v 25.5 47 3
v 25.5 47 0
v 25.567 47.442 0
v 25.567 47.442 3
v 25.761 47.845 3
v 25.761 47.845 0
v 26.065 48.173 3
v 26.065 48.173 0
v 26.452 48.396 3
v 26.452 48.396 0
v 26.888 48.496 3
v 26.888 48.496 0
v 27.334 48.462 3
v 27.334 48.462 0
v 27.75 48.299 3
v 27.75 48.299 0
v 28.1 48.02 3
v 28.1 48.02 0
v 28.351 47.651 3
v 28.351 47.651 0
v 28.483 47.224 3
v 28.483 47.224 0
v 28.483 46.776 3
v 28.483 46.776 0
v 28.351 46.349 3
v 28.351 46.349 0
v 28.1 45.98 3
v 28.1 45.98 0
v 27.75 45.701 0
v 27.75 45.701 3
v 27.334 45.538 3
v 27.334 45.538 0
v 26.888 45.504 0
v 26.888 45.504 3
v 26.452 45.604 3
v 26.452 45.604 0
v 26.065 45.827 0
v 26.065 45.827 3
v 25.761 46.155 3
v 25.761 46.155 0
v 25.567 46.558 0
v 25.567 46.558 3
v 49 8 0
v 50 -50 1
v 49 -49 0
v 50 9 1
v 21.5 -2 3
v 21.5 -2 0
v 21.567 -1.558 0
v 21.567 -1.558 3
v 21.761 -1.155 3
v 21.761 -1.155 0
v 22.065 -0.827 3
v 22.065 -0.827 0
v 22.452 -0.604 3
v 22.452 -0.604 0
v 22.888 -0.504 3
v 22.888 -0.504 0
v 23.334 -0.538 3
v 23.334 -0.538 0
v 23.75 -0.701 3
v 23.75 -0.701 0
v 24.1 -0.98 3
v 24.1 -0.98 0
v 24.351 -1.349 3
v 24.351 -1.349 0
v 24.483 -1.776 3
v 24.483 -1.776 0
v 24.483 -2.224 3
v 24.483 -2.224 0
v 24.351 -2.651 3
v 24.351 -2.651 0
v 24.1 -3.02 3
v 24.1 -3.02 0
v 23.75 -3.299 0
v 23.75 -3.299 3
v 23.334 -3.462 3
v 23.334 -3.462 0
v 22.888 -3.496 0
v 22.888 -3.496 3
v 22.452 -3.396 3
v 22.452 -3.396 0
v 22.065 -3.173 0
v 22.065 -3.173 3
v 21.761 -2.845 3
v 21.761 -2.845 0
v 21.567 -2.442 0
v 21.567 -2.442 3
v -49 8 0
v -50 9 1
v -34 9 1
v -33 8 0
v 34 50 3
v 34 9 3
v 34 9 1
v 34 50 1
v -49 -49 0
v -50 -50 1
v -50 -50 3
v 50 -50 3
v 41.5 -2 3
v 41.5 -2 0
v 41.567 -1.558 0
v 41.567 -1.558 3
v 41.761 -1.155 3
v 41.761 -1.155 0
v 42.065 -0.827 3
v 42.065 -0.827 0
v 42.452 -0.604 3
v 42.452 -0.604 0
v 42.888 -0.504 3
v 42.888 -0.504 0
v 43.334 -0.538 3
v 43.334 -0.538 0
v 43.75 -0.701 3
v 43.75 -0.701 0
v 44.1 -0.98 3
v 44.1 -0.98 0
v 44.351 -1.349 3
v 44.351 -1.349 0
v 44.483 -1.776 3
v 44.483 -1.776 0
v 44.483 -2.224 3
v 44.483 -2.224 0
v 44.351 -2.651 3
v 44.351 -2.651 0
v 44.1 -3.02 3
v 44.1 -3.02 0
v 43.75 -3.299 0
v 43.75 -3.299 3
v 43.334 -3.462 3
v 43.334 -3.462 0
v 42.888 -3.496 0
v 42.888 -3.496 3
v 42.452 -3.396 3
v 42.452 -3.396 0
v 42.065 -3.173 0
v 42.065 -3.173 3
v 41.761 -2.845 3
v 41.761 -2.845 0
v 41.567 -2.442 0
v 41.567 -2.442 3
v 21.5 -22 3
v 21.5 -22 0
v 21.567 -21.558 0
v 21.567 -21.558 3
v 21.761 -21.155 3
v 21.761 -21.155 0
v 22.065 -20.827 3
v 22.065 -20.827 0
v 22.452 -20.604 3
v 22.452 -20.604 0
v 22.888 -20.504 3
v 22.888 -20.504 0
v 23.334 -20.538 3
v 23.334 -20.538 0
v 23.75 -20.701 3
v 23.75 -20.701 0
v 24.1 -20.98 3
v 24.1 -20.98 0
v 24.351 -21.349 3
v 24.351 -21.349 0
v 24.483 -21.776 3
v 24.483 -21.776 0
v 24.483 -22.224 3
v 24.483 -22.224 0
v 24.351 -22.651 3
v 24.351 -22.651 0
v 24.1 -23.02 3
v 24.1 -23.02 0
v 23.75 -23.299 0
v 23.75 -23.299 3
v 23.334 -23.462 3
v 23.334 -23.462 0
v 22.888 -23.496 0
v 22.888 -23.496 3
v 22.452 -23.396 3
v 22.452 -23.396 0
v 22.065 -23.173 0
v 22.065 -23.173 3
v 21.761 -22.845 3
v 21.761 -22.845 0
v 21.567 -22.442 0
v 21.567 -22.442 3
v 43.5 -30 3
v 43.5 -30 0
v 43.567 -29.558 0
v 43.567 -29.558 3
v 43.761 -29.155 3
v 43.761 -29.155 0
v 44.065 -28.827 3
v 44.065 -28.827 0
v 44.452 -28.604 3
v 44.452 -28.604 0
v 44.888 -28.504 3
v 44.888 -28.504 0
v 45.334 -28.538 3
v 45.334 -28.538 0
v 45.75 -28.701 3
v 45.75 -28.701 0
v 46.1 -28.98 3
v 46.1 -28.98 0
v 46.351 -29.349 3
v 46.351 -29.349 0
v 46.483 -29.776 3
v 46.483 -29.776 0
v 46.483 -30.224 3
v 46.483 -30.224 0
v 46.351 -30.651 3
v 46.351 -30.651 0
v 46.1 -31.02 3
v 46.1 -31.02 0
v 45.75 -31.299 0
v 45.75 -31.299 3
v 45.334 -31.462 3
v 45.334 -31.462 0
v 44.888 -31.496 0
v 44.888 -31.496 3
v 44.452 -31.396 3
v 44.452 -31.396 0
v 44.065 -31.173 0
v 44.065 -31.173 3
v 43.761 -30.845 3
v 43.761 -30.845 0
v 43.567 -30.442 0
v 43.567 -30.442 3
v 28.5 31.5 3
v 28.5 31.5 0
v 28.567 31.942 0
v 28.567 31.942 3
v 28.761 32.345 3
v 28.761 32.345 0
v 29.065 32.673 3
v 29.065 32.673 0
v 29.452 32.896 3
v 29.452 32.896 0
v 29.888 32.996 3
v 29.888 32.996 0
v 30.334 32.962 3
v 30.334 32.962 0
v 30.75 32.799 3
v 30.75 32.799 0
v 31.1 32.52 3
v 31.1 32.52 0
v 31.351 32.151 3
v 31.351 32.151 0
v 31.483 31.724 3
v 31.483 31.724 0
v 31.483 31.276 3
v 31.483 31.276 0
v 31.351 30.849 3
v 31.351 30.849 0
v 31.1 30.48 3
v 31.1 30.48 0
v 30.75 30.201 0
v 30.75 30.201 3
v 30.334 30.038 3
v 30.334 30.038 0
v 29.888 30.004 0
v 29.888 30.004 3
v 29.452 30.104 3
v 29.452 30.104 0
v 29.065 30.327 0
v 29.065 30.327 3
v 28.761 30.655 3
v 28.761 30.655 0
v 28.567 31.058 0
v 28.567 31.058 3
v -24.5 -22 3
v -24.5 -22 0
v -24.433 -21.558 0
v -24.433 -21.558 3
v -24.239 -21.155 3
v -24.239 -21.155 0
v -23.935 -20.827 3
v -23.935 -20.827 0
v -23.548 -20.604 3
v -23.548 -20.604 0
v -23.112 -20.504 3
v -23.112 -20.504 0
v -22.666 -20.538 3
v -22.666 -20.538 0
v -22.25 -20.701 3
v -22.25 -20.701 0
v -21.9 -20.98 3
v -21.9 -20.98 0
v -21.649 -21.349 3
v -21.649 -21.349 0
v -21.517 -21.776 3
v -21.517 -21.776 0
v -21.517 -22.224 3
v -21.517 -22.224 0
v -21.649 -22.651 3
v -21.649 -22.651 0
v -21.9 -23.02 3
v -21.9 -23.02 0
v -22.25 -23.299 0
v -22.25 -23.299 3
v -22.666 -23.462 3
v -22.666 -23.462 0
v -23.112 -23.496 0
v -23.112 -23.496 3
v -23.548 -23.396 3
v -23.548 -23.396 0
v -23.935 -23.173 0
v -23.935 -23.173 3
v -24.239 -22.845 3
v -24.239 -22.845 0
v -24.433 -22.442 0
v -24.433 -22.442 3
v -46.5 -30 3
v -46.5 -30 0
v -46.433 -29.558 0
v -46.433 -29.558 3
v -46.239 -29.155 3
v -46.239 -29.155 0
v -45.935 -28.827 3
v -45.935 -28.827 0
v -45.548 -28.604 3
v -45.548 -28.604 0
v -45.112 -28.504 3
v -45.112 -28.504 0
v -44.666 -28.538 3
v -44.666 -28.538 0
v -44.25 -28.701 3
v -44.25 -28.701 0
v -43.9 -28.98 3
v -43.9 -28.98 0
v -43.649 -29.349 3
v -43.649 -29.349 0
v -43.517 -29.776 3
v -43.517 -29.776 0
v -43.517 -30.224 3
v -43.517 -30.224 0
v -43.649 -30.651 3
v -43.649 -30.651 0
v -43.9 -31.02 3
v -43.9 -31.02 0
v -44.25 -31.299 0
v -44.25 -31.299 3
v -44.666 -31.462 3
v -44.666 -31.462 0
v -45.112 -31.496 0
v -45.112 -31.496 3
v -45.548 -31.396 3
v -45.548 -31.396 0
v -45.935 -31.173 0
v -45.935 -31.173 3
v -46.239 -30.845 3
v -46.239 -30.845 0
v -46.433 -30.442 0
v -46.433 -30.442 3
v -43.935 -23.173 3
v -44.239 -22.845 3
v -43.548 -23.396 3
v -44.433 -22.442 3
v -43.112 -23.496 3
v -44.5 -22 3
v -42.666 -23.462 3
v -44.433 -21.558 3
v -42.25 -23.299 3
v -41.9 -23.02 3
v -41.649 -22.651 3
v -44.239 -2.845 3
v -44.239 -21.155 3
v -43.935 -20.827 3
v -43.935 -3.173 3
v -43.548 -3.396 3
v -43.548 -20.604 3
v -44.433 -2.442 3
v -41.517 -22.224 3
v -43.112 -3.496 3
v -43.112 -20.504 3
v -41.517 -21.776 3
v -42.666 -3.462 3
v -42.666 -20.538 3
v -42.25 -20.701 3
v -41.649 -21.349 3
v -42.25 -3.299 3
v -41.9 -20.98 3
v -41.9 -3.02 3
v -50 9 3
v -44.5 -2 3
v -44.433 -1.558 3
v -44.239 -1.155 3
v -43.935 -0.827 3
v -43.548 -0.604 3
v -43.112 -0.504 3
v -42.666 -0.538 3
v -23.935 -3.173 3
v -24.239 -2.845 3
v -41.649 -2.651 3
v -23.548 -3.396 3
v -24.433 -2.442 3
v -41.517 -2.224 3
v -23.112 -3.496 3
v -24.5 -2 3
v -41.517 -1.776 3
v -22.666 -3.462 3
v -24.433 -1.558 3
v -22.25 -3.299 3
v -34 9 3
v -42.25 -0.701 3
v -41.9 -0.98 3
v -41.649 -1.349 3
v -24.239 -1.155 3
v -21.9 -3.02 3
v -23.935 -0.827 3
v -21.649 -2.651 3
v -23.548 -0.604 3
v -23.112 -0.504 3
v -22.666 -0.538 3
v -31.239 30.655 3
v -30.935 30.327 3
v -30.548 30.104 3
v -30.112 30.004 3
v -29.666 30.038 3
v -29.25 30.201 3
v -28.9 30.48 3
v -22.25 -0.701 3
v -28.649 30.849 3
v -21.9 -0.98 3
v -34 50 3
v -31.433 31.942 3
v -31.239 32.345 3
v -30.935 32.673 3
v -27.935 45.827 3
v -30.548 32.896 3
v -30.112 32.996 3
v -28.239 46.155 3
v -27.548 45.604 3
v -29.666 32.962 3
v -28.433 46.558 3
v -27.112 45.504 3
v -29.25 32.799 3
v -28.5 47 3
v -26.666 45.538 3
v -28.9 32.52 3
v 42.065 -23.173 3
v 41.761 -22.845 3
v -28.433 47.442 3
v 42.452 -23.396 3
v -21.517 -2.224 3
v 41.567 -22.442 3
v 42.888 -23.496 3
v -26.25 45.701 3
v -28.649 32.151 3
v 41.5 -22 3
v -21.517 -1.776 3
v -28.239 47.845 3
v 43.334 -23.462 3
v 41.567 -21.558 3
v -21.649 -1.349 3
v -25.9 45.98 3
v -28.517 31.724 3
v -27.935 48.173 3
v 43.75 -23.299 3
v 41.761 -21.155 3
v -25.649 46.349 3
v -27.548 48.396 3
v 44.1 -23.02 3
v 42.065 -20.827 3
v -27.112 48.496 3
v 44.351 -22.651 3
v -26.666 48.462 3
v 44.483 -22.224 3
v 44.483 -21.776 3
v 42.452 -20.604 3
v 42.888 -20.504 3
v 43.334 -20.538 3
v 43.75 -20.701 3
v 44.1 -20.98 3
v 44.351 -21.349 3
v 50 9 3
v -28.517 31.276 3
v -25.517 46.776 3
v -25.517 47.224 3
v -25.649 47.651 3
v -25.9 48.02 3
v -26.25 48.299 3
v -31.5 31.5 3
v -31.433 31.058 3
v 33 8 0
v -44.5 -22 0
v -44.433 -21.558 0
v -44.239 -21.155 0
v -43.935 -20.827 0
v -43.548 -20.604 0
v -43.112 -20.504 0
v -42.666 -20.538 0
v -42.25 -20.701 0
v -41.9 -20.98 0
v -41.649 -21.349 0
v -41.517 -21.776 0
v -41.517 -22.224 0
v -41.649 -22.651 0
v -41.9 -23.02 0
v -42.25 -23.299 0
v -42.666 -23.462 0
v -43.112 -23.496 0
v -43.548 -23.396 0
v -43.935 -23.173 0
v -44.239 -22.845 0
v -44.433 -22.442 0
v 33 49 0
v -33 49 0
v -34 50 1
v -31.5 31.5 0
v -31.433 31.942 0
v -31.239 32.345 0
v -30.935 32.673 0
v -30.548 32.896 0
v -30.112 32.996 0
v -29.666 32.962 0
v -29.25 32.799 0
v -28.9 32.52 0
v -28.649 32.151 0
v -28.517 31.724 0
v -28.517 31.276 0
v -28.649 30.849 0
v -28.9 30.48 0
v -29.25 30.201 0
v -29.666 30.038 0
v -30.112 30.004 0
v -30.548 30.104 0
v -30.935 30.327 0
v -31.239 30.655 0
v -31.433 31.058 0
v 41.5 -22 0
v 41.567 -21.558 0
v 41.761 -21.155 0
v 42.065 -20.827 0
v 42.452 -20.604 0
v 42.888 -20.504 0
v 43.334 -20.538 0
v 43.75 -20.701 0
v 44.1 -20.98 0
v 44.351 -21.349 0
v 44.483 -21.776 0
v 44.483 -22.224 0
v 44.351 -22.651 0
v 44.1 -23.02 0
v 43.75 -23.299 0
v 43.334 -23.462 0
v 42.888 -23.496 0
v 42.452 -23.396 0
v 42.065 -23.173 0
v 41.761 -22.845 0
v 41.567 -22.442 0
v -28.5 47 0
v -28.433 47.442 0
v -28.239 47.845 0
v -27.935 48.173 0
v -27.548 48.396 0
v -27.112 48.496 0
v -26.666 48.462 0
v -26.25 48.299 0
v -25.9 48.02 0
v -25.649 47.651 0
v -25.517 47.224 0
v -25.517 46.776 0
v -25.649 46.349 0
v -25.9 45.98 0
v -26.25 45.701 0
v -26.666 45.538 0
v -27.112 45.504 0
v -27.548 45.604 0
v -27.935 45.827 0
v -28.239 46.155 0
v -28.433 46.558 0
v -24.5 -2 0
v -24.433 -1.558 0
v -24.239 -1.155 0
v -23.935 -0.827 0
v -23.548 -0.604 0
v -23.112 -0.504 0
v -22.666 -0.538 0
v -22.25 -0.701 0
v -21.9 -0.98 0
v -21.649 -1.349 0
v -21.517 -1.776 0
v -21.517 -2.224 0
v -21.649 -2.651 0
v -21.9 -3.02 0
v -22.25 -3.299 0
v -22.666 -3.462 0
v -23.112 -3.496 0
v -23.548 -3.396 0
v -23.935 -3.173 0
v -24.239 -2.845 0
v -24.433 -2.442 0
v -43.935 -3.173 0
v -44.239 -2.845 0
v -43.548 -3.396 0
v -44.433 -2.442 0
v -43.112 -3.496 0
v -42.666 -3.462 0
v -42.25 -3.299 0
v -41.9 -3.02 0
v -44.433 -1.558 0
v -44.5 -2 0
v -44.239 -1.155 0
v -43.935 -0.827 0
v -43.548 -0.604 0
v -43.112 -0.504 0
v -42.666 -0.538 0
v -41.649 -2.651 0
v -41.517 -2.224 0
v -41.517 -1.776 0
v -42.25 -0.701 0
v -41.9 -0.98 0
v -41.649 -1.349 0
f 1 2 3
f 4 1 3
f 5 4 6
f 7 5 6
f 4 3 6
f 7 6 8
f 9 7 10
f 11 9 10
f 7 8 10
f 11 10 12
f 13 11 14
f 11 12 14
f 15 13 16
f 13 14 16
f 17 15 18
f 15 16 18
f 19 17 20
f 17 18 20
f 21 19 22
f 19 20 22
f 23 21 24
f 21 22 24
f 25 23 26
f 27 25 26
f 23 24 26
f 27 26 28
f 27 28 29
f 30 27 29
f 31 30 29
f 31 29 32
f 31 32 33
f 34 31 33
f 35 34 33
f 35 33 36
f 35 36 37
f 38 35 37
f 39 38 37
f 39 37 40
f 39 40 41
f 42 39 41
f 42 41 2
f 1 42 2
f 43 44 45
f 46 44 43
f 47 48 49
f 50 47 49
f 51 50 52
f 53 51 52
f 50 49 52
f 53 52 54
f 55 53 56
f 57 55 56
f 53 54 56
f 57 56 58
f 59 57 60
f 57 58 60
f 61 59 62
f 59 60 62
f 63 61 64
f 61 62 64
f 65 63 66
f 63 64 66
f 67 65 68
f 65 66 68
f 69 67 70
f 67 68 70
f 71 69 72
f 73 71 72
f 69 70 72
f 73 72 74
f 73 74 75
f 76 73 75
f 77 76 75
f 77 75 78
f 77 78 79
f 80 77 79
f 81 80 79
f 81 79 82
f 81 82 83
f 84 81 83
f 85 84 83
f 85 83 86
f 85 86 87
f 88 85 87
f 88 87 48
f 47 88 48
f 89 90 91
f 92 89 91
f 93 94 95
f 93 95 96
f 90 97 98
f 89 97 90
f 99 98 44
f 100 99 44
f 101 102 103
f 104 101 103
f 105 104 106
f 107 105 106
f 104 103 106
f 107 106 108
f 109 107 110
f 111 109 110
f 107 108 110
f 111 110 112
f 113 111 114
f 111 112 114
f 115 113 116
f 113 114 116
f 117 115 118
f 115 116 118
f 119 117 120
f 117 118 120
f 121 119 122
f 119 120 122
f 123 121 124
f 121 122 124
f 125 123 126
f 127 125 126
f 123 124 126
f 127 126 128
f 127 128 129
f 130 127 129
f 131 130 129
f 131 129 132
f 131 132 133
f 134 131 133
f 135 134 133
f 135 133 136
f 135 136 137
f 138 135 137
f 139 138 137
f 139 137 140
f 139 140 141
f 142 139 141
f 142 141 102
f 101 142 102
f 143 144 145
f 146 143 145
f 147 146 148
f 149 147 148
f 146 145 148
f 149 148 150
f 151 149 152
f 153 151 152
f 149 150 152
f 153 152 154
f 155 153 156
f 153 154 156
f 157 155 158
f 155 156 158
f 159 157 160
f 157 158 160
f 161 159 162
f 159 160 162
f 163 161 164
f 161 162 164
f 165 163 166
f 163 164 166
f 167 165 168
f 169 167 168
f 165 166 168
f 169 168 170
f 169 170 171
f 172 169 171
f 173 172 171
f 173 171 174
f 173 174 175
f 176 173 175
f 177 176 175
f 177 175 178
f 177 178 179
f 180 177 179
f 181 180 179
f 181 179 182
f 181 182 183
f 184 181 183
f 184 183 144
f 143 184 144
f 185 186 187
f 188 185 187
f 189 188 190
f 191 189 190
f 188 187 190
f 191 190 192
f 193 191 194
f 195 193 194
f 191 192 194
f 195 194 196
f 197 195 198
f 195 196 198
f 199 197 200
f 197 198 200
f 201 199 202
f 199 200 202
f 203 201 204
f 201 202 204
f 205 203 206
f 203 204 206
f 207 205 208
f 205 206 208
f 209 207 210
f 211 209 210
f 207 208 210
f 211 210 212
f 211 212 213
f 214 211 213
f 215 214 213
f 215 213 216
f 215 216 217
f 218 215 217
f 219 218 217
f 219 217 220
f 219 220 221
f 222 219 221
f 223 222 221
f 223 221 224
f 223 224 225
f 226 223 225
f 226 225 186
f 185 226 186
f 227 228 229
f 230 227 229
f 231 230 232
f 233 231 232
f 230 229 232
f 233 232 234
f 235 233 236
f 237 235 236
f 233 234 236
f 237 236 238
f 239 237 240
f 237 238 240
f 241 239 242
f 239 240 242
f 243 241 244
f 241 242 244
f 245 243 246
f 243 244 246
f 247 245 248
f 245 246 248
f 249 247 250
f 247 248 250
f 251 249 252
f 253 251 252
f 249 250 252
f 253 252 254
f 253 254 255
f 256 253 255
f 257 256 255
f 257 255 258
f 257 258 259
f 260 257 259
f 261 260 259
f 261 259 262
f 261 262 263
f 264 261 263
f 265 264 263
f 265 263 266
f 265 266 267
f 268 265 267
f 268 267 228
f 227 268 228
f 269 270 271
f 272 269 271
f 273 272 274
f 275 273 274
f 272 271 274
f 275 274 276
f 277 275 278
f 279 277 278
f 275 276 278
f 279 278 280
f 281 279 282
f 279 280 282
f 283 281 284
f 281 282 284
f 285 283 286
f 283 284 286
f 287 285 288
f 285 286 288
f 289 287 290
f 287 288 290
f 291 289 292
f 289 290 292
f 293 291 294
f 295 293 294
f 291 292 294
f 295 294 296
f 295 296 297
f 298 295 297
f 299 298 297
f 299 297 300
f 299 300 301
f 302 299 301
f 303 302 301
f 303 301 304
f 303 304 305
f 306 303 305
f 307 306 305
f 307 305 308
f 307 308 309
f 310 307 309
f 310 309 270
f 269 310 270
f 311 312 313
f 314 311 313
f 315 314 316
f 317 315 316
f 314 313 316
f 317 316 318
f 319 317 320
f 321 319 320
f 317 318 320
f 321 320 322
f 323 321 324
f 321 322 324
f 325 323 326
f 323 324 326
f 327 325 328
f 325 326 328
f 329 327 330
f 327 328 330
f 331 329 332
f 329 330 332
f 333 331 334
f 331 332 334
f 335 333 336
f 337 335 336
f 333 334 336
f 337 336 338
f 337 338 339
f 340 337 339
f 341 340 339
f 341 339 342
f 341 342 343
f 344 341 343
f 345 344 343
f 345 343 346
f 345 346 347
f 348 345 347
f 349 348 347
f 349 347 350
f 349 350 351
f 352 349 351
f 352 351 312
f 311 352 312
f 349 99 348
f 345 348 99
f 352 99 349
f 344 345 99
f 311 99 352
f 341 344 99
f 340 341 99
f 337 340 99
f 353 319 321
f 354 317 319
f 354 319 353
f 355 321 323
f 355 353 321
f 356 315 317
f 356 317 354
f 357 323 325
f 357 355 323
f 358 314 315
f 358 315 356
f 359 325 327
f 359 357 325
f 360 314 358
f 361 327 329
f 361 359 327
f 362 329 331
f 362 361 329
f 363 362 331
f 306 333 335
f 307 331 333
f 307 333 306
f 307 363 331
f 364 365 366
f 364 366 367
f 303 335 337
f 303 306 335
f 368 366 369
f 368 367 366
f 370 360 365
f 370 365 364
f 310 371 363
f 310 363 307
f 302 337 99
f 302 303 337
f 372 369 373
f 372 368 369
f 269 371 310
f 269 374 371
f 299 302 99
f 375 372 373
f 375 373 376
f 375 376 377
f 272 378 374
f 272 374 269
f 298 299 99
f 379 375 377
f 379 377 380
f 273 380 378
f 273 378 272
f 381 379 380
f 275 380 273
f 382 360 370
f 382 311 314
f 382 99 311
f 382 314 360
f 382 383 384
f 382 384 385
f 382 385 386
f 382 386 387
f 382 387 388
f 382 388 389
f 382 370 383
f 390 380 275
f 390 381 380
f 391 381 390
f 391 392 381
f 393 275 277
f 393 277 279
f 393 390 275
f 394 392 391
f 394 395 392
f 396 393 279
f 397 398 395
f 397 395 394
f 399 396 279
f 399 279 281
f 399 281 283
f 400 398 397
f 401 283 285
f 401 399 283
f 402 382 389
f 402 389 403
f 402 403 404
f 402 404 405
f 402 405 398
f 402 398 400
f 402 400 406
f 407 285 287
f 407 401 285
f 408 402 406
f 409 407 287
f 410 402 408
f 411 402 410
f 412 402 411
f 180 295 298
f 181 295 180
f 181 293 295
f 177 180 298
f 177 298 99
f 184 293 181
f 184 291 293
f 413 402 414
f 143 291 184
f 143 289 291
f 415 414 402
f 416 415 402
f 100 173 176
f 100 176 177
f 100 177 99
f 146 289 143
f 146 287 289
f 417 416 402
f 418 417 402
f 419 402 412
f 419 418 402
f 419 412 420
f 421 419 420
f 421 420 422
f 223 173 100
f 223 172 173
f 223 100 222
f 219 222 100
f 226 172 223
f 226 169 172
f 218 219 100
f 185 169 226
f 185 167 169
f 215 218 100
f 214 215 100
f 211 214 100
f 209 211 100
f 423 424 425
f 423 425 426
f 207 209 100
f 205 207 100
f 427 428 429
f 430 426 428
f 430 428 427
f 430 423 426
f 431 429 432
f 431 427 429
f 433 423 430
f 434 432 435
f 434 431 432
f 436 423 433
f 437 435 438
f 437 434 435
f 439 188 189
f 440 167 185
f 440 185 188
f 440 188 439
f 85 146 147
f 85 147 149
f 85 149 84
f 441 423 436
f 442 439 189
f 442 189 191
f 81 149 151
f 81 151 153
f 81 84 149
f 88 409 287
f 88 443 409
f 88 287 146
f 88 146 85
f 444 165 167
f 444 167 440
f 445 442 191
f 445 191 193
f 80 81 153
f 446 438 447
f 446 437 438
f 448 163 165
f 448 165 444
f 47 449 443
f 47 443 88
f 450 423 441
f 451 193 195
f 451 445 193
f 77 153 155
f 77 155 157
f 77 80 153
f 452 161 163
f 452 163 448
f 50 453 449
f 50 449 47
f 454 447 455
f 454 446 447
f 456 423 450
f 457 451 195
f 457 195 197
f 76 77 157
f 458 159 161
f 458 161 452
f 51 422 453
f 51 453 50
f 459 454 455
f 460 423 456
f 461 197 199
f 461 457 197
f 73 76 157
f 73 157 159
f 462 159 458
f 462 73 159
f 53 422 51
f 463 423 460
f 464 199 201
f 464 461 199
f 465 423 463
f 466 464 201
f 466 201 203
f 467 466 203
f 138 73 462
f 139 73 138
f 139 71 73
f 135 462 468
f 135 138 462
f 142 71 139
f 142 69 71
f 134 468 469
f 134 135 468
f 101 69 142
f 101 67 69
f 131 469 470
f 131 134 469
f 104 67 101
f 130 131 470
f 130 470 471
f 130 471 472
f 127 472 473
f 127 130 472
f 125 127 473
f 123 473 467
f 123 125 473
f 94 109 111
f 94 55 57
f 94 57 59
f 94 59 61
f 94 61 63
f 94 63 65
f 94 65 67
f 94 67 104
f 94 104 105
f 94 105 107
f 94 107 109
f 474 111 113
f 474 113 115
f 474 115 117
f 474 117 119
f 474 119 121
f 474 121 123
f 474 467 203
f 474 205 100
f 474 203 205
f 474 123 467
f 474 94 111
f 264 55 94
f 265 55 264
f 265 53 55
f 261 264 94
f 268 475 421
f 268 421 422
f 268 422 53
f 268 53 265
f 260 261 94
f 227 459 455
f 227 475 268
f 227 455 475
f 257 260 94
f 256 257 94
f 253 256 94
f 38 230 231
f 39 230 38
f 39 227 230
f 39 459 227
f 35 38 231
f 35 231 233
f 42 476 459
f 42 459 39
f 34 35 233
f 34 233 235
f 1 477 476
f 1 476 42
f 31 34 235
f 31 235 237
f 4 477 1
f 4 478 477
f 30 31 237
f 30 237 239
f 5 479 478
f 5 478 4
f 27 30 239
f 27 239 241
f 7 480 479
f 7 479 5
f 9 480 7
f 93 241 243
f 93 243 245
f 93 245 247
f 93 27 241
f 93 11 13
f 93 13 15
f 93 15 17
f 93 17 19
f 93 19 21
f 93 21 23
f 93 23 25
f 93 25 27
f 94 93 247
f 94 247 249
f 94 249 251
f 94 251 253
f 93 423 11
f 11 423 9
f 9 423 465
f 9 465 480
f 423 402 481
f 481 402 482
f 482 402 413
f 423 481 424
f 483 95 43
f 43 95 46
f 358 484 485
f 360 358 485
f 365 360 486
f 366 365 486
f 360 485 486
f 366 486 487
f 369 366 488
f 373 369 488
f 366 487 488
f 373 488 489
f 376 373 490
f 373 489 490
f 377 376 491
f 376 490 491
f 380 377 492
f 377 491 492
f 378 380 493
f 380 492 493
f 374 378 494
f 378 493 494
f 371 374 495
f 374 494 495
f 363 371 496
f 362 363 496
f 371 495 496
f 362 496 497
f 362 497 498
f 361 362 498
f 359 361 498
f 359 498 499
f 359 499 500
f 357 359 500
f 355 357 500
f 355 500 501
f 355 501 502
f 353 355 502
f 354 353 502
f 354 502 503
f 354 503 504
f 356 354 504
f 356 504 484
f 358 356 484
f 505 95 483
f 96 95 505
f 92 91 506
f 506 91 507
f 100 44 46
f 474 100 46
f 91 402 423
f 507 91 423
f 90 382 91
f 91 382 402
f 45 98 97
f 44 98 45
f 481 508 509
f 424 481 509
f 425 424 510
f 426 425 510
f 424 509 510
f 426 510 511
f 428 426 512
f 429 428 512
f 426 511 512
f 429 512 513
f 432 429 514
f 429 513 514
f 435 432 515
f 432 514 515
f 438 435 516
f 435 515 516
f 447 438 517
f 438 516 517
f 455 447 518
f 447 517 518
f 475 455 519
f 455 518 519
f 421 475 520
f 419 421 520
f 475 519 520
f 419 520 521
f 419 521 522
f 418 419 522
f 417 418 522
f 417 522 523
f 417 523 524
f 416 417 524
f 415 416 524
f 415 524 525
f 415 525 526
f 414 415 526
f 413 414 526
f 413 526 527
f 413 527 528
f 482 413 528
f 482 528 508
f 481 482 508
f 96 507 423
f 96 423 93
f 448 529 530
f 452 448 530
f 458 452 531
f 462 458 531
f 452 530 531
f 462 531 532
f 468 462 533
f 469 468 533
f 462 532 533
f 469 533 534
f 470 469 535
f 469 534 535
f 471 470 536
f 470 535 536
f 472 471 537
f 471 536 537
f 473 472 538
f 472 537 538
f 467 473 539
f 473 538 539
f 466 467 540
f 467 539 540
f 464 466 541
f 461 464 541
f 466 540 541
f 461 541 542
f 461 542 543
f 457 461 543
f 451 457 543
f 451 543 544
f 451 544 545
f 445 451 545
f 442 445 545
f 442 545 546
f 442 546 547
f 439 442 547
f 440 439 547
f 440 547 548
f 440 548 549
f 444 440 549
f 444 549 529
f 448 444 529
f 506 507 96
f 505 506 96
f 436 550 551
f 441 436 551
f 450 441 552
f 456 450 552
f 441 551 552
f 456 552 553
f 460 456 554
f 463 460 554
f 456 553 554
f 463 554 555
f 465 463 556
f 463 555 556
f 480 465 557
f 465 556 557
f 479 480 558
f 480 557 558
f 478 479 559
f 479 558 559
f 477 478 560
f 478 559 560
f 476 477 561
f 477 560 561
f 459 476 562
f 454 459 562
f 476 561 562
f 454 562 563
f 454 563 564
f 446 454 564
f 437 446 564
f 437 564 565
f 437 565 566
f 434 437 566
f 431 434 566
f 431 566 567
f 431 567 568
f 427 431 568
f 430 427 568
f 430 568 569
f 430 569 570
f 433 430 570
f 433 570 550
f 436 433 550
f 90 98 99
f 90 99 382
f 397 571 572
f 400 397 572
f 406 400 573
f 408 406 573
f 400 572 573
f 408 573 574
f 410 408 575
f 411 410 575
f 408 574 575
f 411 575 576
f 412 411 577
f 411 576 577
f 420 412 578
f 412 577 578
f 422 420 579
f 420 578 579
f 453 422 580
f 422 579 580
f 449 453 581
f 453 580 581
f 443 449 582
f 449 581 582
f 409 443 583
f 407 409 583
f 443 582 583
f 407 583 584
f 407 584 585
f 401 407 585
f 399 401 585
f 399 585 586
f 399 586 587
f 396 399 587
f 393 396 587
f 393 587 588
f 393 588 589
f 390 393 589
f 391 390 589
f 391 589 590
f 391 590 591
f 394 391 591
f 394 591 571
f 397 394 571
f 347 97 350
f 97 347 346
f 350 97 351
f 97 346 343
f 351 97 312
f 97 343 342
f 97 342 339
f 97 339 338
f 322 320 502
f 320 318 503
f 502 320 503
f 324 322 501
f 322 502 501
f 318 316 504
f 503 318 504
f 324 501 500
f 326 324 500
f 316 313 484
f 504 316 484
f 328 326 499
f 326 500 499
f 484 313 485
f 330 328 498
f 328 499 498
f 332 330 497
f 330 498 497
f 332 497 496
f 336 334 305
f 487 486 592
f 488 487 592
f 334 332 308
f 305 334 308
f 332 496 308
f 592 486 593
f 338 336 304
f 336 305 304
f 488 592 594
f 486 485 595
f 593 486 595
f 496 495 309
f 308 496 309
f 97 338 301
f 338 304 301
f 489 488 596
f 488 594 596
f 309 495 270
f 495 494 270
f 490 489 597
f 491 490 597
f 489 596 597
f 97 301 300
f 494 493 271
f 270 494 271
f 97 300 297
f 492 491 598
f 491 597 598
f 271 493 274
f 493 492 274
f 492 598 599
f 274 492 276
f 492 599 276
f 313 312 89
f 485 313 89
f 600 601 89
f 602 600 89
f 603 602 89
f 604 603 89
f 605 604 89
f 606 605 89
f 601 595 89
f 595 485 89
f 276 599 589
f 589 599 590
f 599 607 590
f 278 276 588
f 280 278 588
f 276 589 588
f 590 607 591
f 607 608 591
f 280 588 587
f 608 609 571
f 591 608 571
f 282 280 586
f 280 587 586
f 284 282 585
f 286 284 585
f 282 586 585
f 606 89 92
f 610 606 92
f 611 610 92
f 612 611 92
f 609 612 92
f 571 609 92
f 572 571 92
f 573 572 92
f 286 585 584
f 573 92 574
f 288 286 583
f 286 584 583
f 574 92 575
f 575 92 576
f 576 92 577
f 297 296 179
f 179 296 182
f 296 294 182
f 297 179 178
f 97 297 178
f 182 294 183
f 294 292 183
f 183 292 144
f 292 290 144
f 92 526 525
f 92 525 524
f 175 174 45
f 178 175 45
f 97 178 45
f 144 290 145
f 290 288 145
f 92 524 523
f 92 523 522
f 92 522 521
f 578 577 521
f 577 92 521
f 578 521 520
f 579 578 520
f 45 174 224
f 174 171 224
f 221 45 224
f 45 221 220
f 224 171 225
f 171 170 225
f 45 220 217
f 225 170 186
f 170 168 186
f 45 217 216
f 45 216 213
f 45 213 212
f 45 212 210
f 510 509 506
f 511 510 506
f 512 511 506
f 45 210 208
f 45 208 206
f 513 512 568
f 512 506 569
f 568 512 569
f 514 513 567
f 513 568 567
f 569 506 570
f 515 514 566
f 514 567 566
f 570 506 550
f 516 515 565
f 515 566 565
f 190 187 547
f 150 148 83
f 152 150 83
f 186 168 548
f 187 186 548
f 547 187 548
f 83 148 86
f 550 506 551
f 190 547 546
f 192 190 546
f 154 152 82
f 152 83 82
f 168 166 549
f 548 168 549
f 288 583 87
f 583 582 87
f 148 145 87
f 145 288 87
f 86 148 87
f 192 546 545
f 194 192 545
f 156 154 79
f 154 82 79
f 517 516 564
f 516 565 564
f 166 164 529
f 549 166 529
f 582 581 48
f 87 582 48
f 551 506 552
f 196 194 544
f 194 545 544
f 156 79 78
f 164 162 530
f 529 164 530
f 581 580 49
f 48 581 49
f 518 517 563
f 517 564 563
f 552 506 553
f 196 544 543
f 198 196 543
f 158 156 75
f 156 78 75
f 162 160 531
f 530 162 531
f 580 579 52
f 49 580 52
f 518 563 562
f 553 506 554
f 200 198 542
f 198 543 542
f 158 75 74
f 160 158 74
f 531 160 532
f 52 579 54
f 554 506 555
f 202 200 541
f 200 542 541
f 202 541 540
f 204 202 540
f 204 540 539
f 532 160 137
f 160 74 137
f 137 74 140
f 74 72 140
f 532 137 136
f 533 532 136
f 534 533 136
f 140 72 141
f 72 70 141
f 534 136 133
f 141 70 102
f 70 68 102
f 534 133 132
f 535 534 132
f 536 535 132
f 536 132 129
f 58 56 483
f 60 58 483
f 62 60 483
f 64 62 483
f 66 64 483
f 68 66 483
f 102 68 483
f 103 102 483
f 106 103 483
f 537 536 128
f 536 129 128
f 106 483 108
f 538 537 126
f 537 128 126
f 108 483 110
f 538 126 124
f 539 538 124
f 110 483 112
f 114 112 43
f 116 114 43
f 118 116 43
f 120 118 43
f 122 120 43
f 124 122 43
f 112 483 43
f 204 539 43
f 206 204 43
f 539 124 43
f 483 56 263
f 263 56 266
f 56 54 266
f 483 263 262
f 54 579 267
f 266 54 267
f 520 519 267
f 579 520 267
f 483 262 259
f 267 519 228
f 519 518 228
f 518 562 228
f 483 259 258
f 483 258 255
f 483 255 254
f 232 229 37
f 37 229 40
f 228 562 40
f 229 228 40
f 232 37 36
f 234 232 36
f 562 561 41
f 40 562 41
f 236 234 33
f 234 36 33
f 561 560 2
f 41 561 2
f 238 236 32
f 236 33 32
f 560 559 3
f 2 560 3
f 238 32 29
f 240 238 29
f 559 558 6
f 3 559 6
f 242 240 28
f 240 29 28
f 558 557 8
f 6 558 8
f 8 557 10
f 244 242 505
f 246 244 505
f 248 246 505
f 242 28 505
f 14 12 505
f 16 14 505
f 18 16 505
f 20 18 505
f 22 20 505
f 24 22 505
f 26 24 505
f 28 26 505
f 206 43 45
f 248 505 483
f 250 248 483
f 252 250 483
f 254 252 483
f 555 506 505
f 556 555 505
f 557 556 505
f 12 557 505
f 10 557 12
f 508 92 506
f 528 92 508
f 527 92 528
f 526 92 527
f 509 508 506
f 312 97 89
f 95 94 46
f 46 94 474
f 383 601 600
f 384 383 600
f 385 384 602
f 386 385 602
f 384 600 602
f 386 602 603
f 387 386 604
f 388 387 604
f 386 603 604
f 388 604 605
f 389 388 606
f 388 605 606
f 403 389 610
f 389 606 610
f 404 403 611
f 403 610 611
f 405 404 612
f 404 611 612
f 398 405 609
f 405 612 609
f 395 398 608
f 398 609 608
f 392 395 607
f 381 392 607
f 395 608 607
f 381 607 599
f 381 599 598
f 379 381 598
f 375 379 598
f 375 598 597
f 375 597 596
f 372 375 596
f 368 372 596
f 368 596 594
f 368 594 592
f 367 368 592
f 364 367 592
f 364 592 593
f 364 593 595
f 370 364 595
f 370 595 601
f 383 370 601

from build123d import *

# Parameters (mm, degrees)
F0_W     = 100
F0_H     = 100
F1_DEPTH = 3
F3_D     = 3
F4_W     = 16
F4_H     = 41
F5_DEPTH = 3
F7_D     = 3
F8_SIZE  = 1
F10_D    = 3


with BuildPart() as f1:
    # F0 (on Top) → F1 (new body)
    with BuildSketch(Plane.XY):
        Rectangle(F0_W, F0_H)
    extrude(amount=F1_DEPTH)

    # F3 (through all)
    with Locations(Plane.XY.offset(3)):
        with Locations((-30, 31.5), (30, 31.5)):
            Hole(F3_D / 2)

    # F4 (on face) → F5 (cut)
    with BuildSketch(Plane.XY.offset(3)):
        with Locations((-42, 29.5)):
            Rectangle(F4_W, F4_H)
        with Locations((42, 29.5)):
            Rectangle(F4_W, F4_H)
    extrude(amount=-F5_DEPTH, mode=Mode.SUBTRACT)

    # F7 (through all)
    with Locations(Plane.XY.offset(3)):
        with Locations((-43, -2), (-23, -2), (-23, -22), (-43, -22), (23, -2), (43, -2), (43, -22), (23, -22)):
            Hole(F7_D / 2)

    # F8
    f8_edges = [f1.edges().sort_by_distance(p)[0] for p in [
        (0, -50, 0),
        (-50, -20.5, 0),
        (-42, 9, 0),
        (-34, 29.5, 0),
        (0, 50, 0),
        (34, 29.5, 0),
        (42, 9, 0),
        (50, -20.5, 0),
    ]]
    chamfer(f8_edges, length=F8_SIZE)

    # F10 (through all)
    with Locations(Plane.XY.offset(3)):
        with Locations((-45, -30), (45, -30), (-27, 47), (27, 47)):
            Hole(F10_D / 2)


solid = f1.part
